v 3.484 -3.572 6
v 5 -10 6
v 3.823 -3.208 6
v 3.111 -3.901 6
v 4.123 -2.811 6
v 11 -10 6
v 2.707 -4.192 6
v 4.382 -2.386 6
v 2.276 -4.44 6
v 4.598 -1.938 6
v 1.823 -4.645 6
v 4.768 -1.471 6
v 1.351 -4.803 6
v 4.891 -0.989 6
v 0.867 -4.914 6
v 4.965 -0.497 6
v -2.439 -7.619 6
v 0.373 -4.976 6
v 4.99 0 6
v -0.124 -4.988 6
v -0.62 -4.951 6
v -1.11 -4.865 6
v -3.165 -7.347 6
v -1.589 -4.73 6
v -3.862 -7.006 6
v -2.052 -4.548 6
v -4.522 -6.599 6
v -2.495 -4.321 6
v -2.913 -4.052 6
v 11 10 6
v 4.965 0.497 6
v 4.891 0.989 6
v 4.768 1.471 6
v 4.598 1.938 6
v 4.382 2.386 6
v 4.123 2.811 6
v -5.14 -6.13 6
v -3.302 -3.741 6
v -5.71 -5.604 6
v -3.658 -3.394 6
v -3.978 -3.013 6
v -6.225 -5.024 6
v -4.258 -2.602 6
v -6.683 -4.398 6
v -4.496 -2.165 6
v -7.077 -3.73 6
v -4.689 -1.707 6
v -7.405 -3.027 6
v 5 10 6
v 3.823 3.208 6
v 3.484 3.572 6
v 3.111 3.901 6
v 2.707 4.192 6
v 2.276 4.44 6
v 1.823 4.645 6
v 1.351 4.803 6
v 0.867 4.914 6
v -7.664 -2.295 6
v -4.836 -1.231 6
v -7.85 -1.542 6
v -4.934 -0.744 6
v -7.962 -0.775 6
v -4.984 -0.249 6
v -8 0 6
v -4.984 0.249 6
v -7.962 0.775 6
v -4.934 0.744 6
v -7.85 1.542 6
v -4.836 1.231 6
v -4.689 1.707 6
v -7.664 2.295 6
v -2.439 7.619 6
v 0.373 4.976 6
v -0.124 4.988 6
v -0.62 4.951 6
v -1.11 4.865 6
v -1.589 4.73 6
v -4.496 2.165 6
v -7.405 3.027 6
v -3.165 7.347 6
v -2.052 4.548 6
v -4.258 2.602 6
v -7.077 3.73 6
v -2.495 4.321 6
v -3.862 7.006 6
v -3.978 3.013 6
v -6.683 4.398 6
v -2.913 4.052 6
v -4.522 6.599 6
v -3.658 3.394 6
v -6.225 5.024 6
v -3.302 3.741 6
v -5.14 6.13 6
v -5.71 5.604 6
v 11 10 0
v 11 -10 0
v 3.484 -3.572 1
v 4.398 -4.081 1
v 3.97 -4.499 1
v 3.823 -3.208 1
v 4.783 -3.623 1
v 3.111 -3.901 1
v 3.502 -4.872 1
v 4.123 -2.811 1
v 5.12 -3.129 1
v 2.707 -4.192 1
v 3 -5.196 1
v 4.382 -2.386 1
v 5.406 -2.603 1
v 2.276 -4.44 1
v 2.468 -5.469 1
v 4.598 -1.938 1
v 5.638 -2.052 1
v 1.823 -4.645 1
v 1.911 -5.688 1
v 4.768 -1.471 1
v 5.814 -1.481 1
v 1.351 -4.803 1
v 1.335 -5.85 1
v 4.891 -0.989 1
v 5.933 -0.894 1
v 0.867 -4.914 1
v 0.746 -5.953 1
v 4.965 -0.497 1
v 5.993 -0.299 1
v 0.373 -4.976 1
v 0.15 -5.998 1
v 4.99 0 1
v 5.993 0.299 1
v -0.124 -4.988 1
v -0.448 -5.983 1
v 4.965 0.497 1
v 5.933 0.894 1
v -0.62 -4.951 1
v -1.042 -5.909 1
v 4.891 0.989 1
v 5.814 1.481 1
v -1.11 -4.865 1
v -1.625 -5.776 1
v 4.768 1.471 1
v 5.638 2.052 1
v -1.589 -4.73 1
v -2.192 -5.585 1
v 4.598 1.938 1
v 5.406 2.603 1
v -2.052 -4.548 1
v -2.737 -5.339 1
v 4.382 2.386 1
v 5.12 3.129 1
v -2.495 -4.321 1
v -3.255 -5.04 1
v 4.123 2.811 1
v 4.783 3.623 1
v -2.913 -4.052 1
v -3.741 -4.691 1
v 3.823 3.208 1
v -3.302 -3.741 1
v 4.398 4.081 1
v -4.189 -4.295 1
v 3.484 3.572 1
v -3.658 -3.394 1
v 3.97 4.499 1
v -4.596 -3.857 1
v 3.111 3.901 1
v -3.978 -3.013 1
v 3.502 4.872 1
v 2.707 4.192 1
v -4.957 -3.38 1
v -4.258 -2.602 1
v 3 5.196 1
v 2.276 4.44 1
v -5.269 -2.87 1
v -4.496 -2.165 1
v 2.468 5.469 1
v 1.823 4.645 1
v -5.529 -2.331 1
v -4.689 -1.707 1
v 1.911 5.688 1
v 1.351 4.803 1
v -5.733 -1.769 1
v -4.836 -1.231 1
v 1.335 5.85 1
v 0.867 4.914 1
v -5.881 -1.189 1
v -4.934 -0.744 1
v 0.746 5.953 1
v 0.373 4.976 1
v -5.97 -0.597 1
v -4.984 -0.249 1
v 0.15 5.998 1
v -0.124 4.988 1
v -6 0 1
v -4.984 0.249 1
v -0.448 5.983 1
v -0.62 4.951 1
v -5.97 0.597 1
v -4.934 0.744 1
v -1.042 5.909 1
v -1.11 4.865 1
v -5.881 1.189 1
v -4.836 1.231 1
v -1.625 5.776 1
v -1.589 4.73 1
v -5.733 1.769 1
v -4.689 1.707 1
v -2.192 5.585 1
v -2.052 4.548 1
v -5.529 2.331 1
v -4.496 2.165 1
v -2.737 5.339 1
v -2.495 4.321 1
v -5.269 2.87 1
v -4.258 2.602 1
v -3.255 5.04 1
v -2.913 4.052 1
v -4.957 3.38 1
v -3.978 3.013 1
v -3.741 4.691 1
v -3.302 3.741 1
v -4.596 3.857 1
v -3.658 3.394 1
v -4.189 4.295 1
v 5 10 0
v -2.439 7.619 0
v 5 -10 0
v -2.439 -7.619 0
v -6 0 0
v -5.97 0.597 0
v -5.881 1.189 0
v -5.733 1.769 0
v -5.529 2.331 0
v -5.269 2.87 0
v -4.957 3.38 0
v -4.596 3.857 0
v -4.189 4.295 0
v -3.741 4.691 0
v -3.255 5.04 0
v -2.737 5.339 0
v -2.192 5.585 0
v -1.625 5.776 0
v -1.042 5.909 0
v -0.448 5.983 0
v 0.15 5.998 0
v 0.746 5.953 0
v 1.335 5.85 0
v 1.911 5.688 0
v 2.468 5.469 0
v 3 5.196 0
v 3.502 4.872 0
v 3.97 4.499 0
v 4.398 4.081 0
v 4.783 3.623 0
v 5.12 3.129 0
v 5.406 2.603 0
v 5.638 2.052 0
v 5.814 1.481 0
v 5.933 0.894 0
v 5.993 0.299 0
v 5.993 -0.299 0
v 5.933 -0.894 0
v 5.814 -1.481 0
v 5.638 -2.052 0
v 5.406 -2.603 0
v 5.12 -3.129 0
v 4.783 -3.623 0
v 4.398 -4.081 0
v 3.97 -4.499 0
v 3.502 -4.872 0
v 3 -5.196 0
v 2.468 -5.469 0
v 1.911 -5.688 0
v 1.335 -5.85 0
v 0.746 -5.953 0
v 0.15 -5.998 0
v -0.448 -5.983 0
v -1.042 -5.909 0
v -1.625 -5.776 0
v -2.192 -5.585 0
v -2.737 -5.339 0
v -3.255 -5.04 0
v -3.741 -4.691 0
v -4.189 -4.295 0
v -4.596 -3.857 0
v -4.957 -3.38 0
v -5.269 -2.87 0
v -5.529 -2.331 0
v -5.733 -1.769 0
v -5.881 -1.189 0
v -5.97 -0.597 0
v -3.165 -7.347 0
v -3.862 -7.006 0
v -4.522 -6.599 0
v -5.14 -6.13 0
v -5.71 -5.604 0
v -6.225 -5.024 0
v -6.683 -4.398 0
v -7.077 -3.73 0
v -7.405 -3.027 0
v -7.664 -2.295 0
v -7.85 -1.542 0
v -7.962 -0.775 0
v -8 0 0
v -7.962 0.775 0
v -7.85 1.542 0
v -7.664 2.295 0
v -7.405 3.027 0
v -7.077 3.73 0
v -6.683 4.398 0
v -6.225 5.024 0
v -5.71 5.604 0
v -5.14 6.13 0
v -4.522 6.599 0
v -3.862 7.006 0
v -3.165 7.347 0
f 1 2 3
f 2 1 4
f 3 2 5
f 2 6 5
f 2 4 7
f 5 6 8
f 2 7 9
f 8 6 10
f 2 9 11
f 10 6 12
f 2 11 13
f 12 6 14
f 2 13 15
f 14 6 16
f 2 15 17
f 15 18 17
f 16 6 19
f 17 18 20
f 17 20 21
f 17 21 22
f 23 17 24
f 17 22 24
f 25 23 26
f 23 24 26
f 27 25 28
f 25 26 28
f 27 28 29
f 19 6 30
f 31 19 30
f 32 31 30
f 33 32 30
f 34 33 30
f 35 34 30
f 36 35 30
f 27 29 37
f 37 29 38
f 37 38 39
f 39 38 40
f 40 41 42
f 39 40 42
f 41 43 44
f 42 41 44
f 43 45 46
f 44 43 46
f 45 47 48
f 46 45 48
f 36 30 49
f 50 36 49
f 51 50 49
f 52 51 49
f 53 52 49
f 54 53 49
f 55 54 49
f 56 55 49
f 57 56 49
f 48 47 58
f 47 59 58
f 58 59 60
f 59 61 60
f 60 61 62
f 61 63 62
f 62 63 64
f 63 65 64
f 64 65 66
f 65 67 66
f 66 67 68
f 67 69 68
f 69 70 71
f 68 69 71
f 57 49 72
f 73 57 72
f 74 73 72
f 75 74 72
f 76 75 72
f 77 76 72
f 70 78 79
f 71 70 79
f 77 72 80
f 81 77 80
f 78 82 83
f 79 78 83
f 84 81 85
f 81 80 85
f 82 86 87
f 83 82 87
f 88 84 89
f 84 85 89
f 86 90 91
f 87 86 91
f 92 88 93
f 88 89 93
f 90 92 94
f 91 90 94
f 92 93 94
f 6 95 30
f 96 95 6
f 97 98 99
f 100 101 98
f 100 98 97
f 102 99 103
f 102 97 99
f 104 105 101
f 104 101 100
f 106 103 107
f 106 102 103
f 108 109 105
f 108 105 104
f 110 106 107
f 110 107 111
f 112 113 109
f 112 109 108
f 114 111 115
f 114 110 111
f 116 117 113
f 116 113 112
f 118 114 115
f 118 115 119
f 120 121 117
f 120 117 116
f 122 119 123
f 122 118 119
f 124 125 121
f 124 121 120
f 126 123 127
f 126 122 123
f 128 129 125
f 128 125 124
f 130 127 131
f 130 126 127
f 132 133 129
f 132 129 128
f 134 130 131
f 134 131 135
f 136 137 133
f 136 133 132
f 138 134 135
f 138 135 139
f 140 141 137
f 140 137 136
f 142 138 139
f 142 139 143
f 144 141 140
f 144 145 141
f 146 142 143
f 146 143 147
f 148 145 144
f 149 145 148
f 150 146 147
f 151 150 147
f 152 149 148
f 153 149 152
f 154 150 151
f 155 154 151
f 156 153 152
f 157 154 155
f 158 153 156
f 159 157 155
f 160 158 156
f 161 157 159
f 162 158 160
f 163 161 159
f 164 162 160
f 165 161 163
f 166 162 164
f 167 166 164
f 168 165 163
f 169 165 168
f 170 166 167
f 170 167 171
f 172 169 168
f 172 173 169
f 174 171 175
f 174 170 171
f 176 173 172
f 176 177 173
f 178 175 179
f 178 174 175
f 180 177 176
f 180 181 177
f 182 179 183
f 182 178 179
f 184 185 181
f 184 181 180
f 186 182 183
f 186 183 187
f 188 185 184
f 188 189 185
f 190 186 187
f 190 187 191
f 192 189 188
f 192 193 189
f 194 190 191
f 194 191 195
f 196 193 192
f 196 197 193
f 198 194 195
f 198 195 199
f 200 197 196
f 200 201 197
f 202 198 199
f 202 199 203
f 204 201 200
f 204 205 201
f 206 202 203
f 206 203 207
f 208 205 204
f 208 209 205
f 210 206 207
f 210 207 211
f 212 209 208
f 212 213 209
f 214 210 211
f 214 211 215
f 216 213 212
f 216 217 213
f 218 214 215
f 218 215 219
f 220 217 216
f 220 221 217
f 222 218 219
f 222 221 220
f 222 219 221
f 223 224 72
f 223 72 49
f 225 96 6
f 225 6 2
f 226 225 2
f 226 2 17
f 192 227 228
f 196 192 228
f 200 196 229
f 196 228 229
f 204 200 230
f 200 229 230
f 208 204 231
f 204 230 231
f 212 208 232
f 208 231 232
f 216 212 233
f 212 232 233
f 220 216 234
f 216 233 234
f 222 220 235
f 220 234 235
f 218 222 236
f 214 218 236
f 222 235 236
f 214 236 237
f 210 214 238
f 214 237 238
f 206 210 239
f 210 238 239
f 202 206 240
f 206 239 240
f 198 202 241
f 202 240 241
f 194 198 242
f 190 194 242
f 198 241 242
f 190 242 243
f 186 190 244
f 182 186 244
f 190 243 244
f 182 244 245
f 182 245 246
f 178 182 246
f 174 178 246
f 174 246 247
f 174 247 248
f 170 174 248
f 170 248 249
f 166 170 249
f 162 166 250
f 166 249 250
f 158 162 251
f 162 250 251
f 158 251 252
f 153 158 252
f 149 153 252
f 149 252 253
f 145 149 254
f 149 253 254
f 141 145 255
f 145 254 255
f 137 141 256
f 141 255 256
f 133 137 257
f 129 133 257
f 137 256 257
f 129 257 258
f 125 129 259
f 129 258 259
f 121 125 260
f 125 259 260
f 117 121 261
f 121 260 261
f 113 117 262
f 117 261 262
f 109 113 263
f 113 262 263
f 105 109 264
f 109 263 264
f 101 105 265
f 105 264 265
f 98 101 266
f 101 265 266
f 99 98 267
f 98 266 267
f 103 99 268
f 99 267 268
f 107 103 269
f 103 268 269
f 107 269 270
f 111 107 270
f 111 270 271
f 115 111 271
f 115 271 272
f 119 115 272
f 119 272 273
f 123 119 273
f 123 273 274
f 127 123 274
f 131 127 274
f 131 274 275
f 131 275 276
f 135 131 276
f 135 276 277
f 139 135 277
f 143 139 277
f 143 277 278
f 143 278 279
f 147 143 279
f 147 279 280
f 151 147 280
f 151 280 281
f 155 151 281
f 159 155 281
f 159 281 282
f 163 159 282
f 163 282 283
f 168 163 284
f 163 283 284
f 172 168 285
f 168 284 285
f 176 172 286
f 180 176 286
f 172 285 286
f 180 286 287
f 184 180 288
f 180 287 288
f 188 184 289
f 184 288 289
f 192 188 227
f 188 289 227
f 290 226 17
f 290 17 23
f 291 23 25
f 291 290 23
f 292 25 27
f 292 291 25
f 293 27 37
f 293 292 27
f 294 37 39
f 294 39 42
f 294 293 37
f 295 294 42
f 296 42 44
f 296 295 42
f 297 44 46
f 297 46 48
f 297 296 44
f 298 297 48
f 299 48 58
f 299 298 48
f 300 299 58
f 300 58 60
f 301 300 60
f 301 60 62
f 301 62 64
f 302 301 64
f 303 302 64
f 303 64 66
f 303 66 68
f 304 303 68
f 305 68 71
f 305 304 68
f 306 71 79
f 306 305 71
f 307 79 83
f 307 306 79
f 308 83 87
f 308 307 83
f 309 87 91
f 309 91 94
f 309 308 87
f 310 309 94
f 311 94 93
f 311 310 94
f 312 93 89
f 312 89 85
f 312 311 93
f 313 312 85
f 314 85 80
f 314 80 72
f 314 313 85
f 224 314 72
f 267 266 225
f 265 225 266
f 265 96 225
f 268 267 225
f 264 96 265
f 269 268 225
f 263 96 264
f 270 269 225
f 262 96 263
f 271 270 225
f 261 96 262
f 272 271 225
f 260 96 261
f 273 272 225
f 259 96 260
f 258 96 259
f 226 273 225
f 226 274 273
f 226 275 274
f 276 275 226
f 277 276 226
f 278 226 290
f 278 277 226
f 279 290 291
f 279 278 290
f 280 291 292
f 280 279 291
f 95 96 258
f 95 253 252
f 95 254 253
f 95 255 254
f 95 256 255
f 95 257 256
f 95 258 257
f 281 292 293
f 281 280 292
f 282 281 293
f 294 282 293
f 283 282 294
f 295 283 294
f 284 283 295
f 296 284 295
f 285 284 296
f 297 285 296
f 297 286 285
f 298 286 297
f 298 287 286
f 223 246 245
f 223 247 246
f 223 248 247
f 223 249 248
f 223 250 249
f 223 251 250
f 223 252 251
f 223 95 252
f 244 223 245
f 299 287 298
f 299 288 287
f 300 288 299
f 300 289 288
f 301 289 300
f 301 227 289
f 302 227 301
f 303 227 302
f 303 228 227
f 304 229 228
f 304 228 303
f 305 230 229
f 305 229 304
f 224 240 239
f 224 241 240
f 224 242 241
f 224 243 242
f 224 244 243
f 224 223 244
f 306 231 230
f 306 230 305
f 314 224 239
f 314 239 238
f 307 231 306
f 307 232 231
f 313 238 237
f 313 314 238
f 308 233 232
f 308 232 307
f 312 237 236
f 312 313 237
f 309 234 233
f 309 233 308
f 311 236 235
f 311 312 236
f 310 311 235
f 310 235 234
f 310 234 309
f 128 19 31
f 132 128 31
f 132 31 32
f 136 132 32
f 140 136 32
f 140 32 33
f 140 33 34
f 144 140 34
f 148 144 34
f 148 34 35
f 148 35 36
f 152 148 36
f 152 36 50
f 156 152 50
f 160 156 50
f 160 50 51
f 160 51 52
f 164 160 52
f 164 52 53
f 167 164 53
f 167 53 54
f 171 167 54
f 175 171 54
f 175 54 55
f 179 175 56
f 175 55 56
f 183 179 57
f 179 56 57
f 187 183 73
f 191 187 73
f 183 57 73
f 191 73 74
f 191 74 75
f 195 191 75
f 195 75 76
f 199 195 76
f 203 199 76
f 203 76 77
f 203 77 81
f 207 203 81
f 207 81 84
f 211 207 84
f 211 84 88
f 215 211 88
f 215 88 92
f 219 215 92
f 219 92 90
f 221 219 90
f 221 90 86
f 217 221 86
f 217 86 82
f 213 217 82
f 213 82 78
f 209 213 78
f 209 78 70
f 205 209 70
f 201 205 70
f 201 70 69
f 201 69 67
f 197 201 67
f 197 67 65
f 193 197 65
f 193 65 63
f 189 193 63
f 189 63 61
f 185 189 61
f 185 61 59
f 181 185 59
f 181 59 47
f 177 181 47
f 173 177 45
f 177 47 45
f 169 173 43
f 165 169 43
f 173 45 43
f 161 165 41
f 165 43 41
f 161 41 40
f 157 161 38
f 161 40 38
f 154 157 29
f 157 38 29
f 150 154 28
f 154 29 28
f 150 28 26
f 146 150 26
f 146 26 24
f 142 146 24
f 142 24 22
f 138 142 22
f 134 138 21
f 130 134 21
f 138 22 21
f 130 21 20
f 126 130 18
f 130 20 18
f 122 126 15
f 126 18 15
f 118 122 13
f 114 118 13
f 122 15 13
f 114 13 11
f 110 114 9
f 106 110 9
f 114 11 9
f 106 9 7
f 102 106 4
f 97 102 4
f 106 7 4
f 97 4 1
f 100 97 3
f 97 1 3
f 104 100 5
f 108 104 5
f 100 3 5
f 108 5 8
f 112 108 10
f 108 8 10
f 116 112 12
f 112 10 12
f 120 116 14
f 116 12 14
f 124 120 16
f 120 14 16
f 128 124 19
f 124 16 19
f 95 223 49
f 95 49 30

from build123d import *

# Parameters (mm, degrees)
SKETCH1_R           = 4
BOSS_EXTRUDE1_DEPTH = 6
CUT_EXTRUDE1_REACH  = 18.031
SKETCH4_R           = 4.99
SKETCH6_R           = 6
CUT_EXTRUDE3_DEPTH  = 1


with BuildPart() as part:
    # Sketch1 → Boss-Extrude1 (new body)
    with BuildSketch(Plane.XY):
        with BuildLine():
            Line((-2.438559793, 7.619279896), (5, 10))
            Line((5, 10), (11, 10))
            Line((11, 10), (11, -10))
            Line((11, -10), (5, -10))
            Line((5, -10), (-2.438559793, -7.619279896))
            ThreePointArc((-2.438559793, -7.619279896), (-8, 0), (-2.438559793, 7.619279896))
        make_face()
        Circle(SKETCH1_R, mode=Mode.SUBTRACT)
    extrude(amount=BOSS_EXTRUDE1_DEPTH)

    # Sketch4 → Cut-Extrude1 (cut, up to next)
    with BuildSketch(Plane.XY.offset(6), mode=Mode.PRIVATE) as cut_extrude1_sk1:
        Circle(SKETCH4_R)
    cut_extrude1_tool1 = extrude(cut_extrude1_sk1.sketch, amount=-CUT_EXTRUDE1_REACH, mode=Mode.PRIVATE) & part.part
    add(cut_extrude1_tool1.solids().sort_by_distance((0, 0, 6))[0], mode=Mode.SUBTRACT)

    # Sketch6 → Cut-Extrude3 (cut)
    with BuildSketch(Plane(origin=(0, 0, 0), x_dir=(-1, 0, 0), z_dir=(0, 0, -1))):
        Circle(SKETCH6_R)
    extrude(amount=-CUT_EXTRUDE3_DEPTH, mode=Mode.SUBTRACT)


solid = part.part
